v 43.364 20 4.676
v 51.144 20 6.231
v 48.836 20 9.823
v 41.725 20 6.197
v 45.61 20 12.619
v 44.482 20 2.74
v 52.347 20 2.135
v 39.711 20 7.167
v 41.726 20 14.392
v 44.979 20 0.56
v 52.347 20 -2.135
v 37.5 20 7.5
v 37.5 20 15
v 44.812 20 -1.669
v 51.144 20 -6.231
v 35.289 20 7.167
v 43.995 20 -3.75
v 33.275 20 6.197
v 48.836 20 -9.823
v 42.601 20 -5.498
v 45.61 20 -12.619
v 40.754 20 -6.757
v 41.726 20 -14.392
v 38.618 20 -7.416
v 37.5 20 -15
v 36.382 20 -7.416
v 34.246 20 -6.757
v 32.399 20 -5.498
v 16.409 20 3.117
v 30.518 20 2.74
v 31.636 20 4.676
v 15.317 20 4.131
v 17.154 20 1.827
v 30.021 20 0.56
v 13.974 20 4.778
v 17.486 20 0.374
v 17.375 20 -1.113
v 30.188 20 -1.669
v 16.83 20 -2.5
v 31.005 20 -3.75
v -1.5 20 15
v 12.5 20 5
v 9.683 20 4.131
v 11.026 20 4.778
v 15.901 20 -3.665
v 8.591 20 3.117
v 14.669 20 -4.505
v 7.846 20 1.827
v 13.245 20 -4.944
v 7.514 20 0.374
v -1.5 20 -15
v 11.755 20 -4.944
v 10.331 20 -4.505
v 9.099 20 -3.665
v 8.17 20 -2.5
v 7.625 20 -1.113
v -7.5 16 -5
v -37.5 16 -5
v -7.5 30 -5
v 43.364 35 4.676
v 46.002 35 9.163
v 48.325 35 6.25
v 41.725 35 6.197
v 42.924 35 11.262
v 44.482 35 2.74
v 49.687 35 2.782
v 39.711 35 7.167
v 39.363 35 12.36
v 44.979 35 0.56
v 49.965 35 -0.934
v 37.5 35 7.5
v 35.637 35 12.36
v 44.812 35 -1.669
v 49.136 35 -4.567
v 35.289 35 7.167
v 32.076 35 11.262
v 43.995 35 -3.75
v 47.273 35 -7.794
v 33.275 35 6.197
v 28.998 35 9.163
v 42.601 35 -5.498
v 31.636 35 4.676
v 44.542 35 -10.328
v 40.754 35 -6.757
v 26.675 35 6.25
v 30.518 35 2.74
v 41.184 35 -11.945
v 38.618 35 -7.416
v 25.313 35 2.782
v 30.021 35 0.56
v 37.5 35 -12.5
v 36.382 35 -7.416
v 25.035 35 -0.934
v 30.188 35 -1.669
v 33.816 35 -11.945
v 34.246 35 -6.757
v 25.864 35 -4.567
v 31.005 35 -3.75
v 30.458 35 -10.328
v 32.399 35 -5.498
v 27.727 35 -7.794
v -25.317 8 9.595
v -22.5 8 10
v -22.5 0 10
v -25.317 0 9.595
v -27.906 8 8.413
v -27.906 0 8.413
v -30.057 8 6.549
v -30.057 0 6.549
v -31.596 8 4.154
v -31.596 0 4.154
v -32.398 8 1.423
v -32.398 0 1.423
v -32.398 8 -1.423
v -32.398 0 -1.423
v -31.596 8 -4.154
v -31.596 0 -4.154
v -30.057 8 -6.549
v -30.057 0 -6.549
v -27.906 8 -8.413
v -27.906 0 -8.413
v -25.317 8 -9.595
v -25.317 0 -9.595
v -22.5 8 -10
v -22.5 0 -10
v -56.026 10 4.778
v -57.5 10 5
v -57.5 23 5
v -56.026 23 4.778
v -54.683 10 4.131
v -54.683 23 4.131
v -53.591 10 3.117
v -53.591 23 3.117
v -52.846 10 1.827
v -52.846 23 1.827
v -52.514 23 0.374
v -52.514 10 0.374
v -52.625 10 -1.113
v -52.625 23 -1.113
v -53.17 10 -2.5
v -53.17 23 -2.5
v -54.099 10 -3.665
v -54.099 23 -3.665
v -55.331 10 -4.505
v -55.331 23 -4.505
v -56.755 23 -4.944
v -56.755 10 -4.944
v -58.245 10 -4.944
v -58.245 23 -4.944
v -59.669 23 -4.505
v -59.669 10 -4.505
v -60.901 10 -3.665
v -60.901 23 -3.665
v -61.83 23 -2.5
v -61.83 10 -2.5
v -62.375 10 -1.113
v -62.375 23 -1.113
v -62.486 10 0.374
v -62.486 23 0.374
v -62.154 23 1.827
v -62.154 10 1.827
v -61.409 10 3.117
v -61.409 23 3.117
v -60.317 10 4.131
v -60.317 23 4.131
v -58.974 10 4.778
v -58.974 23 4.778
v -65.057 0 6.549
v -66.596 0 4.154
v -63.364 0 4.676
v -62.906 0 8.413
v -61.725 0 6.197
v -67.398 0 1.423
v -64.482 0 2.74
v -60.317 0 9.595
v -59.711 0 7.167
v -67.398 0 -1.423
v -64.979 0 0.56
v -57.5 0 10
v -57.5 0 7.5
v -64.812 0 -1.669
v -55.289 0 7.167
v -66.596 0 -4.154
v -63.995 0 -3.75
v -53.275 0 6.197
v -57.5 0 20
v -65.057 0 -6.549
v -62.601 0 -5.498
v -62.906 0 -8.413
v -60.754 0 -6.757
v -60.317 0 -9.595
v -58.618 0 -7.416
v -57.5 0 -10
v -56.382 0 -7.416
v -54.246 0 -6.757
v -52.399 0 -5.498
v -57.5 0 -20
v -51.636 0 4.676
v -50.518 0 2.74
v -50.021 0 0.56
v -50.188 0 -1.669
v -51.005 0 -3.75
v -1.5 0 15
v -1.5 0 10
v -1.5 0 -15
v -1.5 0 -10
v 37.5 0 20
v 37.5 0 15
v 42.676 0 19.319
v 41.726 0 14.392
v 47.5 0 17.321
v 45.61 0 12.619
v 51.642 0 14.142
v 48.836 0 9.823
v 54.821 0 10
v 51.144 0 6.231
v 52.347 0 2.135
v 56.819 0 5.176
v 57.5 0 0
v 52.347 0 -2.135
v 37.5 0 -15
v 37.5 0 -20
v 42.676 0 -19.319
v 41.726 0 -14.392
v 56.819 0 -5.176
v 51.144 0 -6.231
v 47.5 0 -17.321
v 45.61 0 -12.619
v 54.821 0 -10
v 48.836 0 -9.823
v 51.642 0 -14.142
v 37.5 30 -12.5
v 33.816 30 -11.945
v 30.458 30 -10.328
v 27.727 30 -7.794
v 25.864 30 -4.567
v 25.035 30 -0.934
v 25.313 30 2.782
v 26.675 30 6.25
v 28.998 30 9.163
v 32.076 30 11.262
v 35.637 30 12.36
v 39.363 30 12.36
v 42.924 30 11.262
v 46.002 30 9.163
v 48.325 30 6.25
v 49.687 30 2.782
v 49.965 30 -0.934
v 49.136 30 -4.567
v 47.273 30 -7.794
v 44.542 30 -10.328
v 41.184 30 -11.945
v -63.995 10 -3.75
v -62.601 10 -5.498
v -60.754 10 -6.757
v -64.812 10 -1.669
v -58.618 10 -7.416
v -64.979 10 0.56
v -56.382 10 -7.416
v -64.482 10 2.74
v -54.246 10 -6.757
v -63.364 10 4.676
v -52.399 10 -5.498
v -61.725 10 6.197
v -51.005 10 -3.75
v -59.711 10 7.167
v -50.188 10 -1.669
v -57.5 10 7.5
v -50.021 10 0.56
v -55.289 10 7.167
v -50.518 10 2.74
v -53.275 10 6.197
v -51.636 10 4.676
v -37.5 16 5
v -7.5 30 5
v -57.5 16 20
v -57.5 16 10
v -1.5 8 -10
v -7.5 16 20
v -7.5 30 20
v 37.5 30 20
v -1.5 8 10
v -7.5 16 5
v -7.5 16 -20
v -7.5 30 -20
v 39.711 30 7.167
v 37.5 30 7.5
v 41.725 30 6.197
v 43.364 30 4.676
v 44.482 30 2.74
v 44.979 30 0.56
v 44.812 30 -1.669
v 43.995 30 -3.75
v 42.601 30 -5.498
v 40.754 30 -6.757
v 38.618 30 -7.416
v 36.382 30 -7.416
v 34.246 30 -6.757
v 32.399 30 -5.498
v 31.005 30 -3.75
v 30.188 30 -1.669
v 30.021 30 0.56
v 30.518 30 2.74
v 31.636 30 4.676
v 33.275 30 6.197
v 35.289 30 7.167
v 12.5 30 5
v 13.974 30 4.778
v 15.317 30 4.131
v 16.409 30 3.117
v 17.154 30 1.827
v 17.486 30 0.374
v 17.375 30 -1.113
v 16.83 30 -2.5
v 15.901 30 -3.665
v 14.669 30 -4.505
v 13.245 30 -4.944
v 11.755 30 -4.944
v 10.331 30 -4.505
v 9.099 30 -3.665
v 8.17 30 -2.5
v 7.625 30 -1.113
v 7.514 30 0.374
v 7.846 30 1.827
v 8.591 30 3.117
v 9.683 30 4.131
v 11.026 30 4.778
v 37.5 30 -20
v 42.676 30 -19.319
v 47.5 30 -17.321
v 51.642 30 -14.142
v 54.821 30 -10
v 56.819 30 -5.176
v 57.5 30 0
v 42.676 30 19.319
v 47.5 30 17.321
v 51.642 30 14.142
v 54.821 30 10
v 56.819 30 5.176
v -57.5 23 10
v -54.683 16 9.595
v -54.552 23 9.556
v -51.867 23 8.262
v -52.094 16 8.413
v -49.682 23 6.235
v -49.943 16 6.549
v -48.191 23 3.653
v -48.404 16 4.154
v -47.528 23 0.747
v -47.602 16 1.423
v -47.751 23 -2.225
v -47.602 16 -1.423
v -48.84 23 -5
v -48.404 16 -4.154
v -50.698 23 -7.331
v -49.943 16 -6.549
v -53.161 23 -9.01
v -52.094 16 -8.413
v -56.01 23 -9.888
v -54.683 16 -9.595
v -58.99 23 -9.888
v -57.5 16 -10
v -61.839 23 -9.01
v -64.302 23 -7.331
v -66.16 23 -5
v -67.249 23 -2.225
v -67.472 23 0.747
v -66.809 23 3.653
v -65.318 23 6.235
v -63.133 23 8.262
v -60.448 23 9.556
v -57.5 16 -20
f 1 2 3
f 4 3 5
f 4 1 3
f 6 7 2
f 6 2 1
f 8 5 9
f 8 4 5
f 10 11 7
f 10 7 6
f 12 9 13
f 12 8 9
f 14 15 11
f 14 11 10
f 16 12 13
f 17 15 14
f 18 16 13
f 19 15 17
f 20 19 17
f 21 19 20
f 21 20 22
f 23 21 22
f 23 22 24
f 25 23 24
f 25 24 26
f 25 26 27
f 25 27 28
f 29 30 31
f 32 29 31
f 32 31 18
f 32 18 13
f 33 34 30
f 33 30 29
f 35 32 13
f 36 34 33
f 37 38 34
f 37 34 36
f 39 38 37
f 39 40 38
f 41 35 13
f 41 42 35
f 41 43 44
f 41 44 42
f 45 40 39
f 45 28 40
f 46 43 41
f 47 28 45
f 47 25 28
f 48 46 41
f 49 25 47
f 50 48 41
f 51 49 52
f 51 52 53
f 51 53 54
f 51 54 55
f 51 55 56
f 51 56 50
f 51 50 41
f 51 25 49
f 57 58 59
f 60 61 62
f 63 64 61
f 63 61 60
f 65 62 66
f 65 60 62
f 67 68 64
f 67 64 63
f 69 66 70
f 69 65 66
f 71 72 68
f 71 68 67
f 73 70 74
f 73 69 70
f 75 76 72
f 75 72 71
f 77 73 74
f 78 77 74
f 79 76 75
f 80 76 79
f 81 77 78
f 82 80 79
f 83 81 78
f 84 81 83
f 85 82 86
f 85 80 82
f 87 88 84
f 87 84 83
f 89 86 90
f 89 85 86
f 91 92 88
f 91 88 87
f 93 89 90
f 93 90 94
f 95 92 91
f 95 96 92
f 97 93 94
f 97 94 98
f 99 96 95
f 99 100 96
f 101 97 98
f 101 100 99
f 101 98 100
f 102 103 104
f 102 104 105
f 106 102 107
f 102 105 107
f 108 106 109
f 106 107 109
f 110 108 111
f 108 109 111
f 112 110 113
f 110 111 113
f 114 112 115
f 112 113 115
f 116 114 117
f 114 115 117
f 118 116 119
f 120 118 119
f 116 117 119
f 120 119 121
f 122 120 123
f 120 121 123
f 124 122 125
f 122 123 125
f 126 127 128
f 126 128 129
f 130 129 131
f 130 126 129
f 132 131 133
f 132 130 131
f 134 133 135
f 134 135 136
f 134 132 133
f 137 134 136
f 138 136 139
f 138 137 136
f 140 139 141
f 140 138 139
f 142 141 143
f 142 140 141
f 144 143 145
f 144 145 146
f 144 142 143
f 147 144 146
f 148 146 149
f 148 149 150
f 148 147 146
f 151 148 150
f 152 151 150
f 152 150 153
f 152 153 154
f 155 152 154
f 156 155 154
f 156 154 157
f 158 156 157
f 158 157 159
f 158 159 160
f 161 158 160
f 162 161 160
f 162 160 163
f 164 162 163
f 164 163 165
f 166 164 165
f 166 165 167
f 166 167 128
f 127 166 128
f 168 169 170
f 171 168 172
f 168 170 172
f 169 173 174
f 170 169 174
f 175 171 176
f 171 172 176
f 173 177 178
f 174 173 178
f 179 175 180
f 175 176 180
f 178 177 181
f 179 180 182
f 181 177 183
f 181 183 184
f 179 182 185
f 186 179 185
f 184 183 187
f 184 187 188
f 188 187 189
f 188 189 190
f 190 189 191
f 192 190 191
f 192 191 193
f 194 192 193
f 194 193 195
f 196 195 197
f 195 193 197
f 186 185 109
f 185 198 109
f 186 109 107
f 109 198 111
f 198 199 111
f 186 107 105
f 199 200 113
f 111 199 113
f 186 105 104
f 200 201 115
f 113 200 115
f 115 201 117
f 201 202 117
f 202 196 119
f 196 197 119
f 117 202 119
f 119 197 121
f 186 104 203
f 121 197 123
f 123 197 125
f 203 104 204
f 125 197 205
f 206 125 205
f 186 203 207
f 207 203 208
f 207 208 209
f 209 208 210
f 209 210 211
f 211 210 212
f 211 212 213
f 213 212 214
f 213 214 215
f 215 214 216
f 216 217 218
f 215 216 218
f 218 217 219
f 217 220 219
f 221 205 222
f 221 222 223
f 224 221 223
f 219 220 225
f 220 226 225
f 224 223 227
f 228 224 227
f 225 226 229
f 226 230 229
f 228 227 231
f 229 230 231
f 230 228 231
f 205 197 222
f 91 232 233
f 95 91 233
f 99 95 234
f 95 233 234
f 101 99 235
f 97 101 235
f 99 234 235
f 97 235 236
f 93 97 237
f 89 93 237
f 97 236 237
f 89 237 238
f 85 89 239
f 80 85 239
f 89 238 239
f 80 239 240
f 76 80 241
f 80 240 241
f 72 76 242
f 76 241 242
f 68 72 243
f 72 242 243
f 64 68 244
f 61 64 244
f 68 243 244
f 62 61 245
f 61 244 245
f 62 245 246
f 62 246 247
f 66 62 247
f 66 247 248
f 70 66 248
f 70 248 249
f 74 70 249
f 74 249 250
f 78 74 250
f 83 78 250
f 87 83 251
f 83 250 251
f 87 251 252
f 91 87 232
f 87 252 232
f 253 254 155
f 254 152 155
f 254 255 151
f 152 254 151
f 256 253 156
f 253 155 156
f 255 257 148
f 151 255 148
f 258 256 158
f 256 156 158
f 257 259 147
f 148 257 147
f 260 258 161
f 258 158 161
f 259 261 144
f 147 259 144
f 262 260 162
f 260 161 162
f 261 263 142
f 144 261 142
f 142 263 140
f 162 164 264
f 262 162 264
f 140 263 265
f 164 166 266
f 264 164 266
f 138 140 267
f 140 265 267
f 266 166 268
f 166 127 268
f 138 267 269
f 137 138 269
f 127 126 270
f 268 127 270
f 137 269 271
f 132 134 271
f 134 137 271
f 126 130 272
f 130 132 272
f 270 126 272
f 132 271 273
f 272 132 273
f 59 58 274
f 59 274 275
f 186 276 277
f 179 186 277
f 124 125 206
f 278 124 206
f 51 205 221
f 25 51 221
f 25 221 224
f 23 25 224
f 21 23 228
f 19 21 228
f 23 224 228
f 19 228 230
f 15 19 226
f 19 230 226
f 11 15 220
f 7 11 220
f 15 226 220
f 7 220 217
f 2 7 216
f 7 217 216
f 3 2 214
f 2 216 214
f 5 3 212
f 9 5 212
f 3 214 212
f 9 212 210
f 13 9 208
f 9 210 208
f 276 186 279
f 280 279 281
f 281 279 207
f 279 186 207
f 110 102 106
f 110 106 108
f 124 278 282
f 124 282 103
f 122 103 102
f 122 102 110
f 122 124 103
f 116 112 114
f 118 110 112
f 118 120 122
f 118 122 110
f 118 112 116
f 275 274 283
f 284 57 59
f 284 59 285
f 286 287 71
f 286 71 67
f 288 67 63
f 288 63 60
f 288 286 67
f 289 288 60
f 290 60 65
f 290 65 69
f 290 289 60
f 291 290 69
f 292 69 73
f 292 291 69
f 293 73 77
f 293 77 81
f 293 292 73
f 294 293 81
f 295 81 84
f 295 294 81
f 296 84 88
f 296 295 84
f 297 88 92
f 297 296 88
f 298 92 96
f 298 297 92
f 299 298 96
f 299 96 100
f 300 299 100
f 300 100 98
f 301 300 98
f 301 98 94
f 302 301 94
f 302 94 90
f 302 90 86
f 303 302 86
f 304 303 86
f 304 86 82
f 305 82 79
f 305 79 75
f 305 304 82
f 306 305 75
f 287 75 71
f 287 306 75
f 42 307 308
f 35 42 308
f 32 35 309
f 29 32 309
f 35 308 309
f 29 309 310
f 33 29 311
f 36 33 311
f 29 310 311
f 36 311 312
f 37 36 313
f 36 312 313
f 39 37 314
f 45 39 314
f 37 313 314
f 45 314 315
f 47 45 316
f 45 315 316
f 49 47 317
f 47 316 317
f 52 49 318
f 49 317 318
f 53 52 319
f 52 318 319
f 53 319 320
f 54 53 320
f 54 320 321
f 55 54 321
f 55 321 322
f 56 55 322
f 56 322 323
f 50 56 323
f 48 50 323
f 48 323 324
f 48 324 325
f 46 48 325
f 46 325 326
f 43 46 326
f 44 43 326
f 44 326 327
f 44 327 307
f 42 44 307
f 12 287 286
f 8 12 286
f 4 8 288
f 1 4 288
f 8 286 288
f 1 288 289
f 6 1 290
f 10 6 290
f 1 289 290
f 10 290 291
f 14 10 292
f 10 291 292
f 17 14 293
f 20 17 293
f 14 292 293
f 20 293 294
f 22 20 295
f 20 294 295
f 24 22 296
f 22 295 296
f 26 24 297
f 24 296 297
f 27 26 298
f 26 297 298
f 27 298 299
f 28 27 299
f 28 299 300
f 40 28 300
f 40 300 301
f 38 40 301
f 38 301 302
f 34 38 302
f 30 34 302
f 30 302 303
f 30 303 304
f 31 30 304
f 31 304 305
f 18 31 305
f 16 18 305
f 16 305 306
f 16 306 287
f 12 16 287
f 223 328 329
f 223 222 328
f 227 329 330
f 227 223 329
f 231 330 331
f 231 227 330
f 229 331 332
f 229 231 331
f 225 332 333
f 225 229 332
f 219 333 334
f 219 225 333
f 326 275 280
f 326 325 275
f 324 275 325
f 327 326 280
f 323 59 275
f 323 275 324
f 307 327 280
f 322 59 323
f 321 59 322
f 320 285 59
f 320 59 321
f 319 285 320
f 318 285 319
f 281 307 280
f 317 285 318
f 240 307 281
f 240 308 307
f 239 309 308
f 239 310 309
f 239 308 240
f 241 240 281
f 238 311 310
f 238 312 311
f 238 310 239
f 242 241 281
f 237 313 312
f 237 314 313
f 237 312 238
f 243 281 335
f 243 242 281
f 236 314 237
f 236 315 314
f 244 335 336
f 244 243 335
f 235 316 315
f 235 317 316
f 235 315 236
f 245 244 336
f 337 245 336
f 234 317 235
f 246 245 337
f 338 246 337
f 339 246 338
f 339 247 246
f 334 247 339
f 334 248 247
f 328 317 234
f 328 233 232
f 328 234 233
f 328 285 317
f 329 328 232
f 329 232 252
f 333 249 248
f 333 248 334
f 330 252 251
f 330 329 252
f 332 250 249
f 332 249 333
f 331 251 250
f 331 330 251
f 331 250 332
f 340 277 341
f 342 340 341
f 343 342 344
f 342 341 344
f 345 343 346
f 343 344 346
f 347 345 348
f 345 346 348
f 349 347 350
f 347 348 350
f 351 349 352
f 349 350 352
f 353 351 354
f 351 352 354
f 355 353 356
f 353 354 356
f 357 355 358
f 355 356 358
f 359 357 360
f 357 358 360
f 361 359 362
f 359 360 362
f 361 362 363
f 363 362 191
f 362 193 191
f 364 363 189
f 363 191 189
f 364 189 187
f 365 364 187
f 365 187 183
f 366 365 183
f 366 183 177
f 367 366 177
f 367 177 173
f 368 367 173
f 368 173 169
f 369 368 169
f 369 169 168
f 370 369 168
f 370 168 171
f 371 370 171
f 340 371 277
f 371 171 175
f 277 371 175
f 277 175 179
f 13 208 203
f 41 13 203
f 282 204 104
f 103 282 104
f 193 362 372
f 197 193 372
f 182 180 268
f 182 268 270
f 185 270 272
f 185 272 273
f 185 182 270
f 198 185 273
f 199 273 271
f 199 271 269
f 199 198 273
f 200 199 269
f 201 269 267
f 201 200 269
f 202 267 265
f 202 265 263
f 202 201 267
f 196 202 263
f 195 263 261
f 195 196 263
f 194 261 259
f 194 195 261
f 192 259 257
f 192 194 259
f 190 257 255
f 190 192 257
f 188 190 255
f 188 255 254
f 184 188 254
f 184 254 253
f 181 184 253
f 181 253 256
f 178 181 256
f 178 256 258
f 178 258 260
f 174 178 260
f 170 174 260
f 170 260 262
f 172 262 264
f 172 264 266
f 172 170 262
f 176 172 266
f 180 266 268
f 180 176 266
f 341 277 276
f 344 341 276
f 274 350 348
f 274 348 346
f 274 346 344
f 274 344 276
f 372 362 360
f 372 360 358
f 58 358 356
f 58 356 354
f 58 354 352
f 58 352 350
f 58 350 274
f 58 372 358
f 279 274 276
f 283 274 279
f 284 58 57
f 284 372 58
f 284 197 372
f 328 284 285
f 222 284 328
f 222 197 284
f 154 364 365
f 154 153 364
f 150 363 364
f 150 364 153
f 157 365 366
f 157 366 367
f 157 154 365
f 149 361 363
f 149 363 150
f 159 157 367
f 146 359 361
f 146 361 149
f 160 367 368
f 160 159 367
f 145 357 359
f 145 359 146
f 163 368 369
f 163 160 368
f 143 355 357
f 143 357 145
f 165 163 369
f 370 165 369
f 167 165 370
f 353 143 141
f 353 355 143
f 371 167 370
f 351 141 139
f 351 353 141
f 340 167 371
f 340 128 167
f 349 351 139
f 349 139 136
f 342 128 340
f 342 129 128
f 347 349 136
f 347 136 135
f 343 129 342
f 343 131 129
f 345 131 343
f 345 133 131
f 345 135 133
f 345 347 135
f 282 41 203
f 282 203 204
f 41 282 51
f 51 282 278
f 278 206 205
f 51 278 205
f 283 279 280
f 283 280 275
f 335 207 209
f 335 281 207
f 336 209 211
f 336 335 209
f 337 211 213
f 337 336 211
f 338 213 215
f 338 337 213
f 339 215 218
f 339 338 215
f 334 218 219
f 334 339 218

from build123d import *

# Parameters (mm, degrees)
SKETCH1_W               = 115
SKETCH1_H               = 40
BOSS_EXTRUDE1_DEPTH     = 16
SKETCH2_R               = 10
SKETCH2_R_2             = 5
BOSS_EXTRUDE2_DEPTH     = 23
SKETCH3_R               = 7.5
CUT_EXTRUDE1_DEPTH      = 10
CUT_EXTRUDE2_DEPTH      = 36
CUT_EXTRUDE2_DEPTH_BACK = 24
SKETCH4_R               = 5
SKETCH5_W               = 65
SKETCH5_H               = 40
BOSS_EXTRUDE3_DEPTH     = 14
RIB2_REACH              = 78.526
SKETCH8_WALL_W          = 188.158169364
SKETCH8_WALL_H          = 10
FILLET3_R               = 20
SKETCH10_R              = 12.5
SKETCH10_R_2            = 7.5
BOSS_EXTRUDE4_DEPTH     = 5
SKETCH11_R              = 7.5
CUT_EXTRUDE3_DEPTH      = 77.526139325
SKETCH12_R              = 5
CUT_EXTRUDE4_DEPTH      = 77.526139325
CUT_EXTRUDE5_DEPTH      = 20
CUT_EXTRUDE6_DEPTH      = 8


with BuildPart() as part:
    # Sketch1 → Boss-Extrude1 (new body)
    with BuildSketch(Plane(origin=(0, 0, 0), x_dir=(1, 0, 0), z_dir=(0, 1, 0))):
        Rectangle(SKETCH1_W, SKETCH1_H)
    extrude(amount=BOSS_EXTRUDE1_DEPTH)

    # Sketch2 → Boss-Extrude2 (add)
    with BuildSketch(Plane(origin=(0, 0, 0), x_dir=(1, 0, 0), z_dir=(0, 1, 0))):
        with Locations(Location((-57.5, 0, 0), (0, 0, 270))):
            Circle(SKETCH2_R)
        with Locations(Location((-57.5, 0, 0), (0, 0, 270))):
            Circle(SKETCH2_R_2, mode=Mode.SUBTRACT)
    extrude(amount=BOSS_EXTRUDE2_DEPTH)

    # Sketch3 → Cut-Extrude1 (cut)
    with BuildSketch(Plane(origin=(0, 0, 0), x_dir=(1, 0, 0), z_dir=(0, 1, 0))):
        with Locations(Location((-57.5, 0, 0), (0, 0, 270))):
            Circle(SKETCH3_R)
    extrude(amount=CUT_EXTRUDE1_DEPTH, mode=Mode.SUBTRACT)

    # Sketch4 → Cut-Extrude2 (cut, two sides: drawn at the far end of the back side and taken through both)
    with BuildSketch(Plane(origin=(0, 0, 0), x_dir=(1, 0, 0), z_dir=(0, 1, 0)).offset(-CUT_EXTRUDE2_DEPTH_BACK)):
        with Locations(Location((-57.5, 0, 0), (0, 0, 270))):
            Circle(SKETCH4_R)
    extrude(amount=CUT_EXTRUDE2_DEPTH + CUT_EXTRUDE2_DEPTH_BACK, mode=Mode.SUBTRACT)

    # Sketch5 → Boss-Extrude3 (add)
    with BuildSketch(Plane(origin=(0, 16, 0), x_dir=(1, 0, 0), z_dir=(0, 1, 0))):
        with Locations((25, 0)):
            Rectangle(SKETCH5_W, SKETCH5_H)
    extrude(amount=BOSS_EXTRUDE3_DEPTH)

    # Sketch8 wall → Rib2 (add, up to next)
    with BuildSketch(Plane(origin=(-22.5, 23, 0), x_dir=(0.906183139995, 0.422885465331, 0), z_dir=(-0.422885465331, 0.906183139995, 0)), mode=Mode.PRIVATE) as rib2_sk1:
        Rectangle(SKETCH8_WALL_W, SKETCH8_WALL_H)
    rib2_tool1 = extrude(rib2_sk1.sketch, amount=-RIB2_REACH, mode=Mode.PRIVATE) - part.part
    add(rib2_tool1.solids().sort_by_distance((-22.5, 23, 0))[0])

    # Fillet3
    fillet3_edges = [part.edges().sort_by_distance(p)[0] for p in [
        (57.5, 15, -20),
        (57.5, 15, 20),
    ]]
    fillet(fillet3_edges, radius=FILLET3_R - 0.0001)  # a hair under: the kernel refuses the full size

    # Sketch10 → Boss-Extrude4 (add)
    with BuildSketch(Plane(origin=(0, 30, 0), x_dir=(1, 0, 0), z_dir=(0, 1, 0))):
        with Locations(Location((37.5, 0, 0), (0, 0, 90))):
            Circle(SKETCH10_R)
        with Locations(Location((37.5, 0, 0), (0, 0, 270))):
            Circle(SKETCH10_R_2, mode=Mode.SUBTRACT)
    extrude(amount=BOSS_EXTRUDE4_DEPTH)

    # Sketch11 → Cut-Extrude3 (cut, through all)
    with BuildSketch(Plane(origin=(0, 30, 0), x_dir=(1, 0, 0), z_dir=(0, 1, 0))):
        with Locations(Location((37.5, 0, 0), (0, 0, 270))):
            Circle(SKETCH11_R)
    extrude(amount=-CUT_EXTRUDE3_DEPTH, mode=Mode.SUBTRACT)

    # Sketch12 → Cut-Extrude4 (cut, through all)
    with BuildSketch(Plane(origin=(0, 30, 0), x_dir=(1, 0, 0), z_dir=(0, 1, 0))):
        with Locations(Location((12.5, 0, 0), (0, 0, 270))):
            Circle(SKETCH12_R)
    extrude(amount=-CUT_EXTRUDE4_DEPTH, mode=Mode.SUBTRACT)

    # Sketch13 → Cut-Extrude5 (cut)
    with BuildSketch(Plane(origin=(0, 0, 0), x_dir=(1, 0, 0), z_dir=(0, 1, 0))):
        with BuildLine():
            Line((37.5, -15), (-1.5, -15))
            Line((-1.5, -15), (-1.5, 15))
            Line((-1.5, 15), (37.5, 15))
            ThreePointArc((37.5, 15), (52.5, 0), (37.5, -15))
        make_face()
    extrude(amount=CUT_EXTRUDE5_DEPTH, mode=Mode.SUBTRACT)

    # Sketch14 → Cut-Extrude6 (cut)
    with BuildSketch(Plane(origin=(0, 0, 0), x_dir=(1, 0, 0), z_dir=(0, 1, 0))):
        with BuildLine():
            Line((-22.5, 10), (-1.5, 10))
            Line((-1.5, 10), (-1.5, -10))
            Line((-1.5, -10), (-22.5, -10))
            ThreePointArc((-22.5, -10), (-32.5, 0), (-22.5, 10))
        make_face()
    extrude(amount=CUT_EXTRUDE6_DEPTH, mode=Mode.SUBTRACT)


solid = part.part
